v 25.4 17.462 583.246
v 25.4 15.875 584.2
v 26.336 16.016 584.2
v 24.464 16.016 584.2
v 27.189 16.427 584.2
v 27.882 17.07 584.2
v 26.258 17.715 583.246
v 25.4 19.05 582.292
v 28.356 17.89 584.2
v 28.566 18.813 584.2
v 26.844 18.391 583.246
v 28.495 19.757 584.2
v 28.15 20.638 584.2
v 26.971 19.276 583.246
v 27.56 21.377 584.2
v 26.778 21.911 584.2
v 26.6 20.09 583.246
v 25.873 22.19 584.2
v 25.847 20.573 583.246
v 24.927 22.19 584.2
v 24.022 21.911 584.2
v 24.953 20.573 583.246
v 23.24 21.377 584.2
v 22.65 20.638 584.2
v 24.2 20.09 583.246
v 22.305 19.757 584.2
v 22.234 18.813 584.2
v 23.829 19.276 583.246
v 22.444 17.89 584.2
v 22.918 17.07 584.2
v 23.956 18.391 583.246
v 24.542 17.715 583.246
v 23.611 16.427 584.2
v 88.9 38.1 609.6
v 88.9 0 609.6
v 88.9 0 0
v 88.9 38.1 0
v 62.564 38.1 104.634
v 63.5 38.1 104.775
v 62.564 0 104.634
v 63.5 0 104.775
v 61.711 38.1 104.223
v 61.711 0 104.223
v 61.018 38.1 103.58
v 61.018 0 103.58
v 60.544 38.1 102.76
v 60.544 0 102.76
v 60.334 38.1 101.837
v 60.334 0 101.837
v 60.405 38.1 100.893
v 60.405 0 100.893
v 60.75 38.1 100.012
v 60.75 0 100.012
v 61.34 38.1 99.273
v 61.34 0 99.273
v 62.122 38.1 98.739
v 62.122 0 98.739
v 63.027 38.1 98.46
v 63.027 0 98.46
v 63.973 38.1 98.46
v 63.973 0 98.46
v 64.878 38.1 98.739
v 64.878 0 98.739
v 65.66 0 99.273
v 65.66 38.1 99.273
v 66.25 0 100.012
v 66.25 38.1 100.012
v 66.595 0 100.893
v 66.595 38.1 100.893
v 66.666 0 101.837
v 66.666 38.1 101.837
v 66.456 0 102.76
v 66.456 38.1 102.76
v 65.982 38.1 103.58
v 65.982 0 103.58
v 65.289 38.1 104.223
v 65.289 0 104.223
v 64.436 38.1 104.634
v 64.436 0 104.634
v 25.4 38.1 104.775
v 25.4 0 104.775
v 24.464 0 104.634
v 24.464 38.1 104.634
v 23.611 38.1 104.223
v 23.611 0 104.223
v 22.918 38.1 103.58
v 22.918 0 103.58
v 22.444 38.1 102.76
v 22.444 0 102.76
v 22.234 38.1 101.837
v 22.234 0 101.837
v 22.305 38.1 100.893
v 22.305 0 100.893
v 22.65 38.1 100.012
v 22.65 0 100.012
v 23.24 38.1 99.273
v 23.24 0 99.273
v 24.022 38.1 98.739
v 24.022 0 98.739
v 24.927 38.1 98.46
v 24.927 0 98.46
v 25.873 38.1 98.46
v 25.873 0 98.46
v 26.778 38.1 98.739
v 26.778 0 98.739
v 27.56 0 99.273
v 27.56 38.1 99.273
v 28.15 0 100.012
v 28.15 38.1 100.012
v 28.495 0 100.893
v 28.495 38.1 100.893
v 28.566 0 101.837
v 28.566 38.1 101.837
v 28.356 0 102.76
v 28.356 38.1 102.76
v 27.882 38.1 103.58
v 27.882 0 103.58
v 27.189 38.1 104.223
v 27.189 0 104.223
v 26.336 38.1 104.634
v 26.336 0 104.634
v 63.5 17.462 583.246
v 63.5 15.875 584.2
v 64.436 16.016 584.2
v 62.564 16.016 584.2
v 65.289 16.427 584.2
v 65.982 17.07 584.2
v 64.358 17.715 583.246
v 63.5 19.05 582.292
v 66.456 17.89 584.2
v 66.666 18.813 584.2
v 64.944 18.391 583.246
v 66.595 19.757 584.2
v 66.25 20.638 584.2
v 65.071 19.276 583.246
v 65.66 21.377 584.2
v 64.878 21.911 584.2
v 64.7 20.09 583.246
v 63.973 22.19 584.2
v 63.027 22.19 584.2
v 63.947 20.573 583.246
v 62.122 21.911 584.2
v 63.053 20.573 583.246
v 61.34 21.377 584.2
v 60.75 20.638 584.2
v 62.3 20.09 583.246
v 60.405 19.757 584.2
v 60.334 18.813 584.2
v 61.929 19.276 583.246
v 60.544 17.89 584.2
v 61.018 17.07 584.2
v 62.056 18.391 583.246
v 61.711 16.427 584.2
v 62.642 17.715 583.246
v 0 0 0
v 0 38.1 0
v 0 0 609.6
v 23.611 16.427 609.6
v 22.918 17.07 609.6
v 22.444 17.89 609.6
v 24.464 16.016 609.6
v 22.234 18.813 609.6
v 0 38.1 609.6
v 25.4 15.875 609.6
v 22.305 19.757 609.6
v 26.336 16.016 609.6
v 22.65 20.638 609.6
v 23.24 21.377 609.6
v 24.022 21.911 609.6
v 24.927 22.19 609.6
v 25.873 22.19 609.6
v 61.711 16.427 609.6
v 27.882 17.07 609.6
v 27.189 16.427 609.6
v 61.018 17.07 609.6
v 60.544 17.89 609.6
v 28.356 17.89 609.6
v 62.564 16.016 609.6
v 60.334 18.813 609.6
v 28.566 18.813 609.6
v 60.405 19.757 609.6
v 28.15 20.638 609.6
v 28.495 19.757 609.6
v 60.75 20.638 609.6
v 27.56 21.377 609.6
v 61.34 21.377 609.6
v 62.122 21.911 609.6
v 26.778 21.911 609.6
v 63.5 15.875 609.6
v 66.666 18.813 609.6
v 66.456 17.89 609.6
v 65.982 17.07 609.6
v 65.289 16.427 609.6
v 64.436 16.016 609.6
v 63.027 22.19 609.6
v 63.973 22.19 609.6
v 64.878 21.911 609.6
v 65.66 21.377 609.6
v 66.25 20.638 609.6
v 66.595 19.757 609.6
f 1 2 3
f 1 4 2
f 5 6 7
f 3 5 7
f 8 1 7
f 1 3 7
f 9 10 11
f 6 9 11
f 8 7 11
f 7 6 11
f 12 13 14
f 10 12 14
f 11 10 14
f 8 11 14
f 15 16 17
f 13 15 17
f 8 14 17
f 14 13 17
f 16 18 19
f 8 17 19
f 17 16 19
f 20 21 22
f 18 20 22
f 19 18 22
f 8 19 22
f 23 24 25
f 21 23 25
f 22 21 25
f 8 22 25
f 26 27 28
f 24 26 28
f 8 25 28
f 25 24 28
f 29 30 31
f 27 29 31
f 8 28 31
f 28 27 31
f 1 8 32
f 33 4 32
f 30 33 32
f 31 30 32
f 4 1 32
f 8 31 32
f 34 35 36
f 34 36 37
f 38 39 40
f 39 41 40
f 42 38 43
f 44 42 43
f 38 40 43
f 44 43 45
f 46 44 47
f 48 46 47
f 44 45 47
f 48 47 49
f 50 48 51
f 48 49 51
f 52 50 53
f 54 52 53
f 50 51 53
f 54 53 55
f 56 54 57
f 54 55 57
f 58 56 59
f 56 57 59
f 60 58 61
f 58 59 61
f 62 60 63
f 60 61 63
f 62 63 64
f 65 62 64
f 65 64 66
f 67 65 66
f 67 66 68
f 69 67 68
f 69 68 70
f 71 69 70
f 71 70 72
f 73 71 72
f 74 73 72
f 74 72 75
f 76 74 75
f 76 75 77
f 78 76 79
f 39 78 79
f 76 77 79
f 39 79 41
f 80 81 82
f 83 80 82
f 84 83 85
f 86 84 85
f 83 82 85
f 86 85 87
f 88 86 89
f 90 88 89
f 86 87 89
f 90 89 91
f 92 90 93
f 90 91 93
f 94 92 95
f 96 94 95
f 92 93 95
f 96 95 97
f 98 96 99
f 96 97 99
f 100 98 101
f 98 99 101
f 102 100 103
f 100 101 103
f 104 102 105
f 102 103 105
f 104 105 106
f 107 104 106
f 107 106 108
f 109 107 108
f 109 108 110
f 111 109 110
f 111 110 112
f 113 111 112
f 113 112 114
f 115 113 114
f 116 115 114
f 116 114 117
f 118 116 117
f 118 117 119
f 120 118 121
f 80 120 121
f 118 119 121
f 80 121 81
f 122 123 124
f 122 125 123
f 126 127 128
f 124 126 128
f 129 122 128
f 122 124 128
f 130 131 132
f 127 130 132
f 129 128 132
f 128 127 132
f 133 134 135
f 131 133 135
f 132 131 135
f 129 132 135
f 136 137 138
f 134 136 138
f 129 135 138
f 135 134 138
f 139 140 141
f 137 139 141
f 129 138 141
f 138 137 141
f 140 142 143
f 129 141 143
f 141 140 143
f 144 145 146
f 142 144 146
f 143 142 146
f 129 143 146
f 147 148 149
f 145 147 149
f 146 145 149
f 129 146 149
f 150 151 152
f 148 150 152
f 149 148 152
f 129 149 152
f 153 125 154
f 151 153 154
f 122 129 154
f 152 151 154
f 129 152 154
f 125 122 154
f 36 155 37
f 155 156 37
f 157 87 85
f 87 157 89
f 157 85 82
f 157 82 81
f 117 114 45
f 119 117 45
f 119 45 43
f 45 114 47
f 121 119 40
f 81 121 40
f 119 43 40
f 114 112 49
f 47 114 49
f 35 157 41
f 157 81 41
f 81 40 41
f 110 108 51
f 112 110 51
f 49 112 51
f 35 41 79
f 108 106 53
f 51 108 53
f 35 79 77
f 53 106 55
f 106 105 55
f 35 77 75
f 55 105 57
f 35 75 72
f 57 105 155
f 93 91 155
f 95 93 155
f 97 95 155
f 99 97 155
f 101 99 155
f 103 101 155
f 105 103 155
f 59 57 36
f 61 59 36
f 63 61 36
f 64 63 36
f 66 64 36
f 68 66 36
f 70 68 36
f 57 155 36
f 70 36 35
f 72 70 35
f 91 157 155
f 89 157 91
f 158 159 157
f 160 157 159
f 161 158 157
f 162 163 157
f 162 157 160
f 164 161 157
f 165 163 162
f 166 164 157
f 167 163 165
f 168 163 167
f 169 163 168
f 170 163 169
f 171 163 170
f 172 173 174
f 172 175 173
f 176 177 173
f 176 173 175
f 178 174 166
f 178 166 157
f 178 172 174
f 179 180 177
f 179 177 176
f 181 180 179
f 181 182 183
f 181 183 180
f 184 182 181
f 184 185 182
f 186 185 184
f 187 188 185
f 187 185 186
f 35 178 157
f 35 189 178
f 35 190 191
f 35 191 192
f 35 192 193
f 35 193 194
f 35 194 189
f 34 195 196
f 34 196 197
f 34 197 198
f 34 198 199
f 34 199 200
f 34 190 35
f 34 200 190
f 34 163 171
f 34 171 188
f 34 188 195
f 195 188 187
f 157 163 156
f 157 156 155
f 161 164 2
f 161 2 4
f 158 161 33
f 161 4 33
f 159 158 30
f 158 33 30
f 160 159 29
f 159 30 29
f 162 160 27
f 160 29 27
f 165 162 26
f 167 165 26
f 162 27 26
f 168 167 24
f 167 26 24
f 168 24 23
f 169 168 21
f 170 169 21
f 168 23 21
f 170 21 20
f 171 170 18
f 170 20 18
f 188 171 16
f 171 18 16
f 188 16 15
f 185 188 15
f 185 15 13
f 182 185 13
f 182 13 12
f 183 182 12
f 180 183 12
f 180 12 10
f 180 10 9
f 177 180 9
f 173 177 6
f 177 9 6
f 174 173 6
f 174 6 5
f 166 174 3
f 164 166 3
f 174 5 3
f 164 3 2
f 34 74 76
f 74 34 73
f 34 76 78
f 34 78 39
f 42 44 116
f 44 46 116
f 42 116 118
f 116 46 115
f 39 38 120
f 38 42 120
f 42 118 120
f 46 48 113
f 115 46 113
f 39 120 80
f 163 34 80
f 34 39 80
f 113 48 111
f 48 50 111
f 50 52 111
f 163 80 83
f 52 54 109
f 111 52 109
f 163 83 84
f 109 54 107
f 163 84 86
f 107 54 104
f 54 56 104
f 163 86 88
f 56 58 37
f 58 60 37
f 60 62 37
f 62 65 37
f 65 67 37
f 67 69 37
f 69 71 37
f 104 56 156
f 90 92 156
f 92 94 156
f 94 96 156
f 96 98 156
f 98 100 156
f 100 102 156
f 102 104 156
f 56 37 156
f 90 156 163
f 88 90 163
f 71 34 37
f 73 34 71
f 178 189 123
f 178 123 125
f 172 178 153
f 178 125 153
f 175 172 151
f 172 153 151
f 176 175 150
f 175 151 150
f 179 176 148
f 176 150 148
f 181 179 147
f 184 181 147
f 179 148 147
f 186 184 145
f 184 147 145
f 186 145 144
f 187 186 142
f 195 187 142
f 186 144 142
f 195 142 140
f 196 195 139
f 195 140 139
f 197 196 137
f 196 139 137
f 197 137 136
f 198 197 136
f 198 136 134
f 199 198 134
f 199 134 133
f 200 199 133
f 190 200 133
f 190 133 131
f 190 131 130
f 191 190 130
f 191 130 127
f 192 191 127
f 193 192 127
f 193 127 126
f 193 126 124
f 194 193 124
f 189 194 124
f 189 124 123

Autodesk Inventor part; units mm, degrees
ref_plane "YZ Plane" through (0, 0, 0) normal (1, 0, 0) x (0, 1, 0)
ref_plane "XZ Plane" through (0, 0, 0) normal (0, 1, 0) x (-1, 0, 0)
ref_plane "XY Plane" through (0, 0, 0) normal (0, 0, 1) x (1, 0, 0)
sketch "Sketch1" plane through (0, 0, 0) normal (0, 0, 1) x (1, 0, 0)
  line L0 (0, 0) -> (88.9, 0)
  line L1 (88.9, 0) -> (88.9, 38.1)
  line L2 (88.9, 38.1) -> (0, 38.1)
  line L3 (0, 38.1) -> (0, 0)
  dimension "d0" = 88.9
  dimension "d1" = 38.1
extrude "Extrusion1" add sketch "Sketch1" along normal blind 609.6
sketch "Sketch2" plane through (0, 0, 609.6) normal (0, 0, 1) x (1, 0, 0)
  line L0 (0, 0) -> (88.9, 0) projected
  line L1 (0, 38.1) -> (0, 0) projected
  circle A0 centre (25.4, 19.05) radius 5.7238
  circle A1 centre (63.5, 19.05) radius 5.7238
  dimension "d4" = 25.4
  dimension "d7" = 38.1
hole "Hole1" at (25.4, 19.05, 609.6) at (63.5, 19.05, 609.6) direction (0, 0, -1) diameter 6.35 depth 25.4 tip angle 118
sketch "Sketch3" plane through (0, 38.1, 0) normal (0, 1, 0) x (1, 0, 0)
  line L0 (88.9, 0) -> (0, 0) projected
  line L1 (0, 0) -> (0, -609.6) projected
  circle A0 centre (25.4, -101.6) radius 3.5498
  circle A1 centre (63.5, -101.6) radius 3.5498
  dimension "d19" = 25.4
  dimension "d20" = 101.6
  dimension "d23" = 38.1
hole "Hole2" at (63.5, 38.1, 101.6) at (25.4, 38.1, 101.6) direction (0, -1, 0) diameter 6.35 end through all
properties part number "pole_EdgeUprightHoriz" material "Wood (Cherry)"
